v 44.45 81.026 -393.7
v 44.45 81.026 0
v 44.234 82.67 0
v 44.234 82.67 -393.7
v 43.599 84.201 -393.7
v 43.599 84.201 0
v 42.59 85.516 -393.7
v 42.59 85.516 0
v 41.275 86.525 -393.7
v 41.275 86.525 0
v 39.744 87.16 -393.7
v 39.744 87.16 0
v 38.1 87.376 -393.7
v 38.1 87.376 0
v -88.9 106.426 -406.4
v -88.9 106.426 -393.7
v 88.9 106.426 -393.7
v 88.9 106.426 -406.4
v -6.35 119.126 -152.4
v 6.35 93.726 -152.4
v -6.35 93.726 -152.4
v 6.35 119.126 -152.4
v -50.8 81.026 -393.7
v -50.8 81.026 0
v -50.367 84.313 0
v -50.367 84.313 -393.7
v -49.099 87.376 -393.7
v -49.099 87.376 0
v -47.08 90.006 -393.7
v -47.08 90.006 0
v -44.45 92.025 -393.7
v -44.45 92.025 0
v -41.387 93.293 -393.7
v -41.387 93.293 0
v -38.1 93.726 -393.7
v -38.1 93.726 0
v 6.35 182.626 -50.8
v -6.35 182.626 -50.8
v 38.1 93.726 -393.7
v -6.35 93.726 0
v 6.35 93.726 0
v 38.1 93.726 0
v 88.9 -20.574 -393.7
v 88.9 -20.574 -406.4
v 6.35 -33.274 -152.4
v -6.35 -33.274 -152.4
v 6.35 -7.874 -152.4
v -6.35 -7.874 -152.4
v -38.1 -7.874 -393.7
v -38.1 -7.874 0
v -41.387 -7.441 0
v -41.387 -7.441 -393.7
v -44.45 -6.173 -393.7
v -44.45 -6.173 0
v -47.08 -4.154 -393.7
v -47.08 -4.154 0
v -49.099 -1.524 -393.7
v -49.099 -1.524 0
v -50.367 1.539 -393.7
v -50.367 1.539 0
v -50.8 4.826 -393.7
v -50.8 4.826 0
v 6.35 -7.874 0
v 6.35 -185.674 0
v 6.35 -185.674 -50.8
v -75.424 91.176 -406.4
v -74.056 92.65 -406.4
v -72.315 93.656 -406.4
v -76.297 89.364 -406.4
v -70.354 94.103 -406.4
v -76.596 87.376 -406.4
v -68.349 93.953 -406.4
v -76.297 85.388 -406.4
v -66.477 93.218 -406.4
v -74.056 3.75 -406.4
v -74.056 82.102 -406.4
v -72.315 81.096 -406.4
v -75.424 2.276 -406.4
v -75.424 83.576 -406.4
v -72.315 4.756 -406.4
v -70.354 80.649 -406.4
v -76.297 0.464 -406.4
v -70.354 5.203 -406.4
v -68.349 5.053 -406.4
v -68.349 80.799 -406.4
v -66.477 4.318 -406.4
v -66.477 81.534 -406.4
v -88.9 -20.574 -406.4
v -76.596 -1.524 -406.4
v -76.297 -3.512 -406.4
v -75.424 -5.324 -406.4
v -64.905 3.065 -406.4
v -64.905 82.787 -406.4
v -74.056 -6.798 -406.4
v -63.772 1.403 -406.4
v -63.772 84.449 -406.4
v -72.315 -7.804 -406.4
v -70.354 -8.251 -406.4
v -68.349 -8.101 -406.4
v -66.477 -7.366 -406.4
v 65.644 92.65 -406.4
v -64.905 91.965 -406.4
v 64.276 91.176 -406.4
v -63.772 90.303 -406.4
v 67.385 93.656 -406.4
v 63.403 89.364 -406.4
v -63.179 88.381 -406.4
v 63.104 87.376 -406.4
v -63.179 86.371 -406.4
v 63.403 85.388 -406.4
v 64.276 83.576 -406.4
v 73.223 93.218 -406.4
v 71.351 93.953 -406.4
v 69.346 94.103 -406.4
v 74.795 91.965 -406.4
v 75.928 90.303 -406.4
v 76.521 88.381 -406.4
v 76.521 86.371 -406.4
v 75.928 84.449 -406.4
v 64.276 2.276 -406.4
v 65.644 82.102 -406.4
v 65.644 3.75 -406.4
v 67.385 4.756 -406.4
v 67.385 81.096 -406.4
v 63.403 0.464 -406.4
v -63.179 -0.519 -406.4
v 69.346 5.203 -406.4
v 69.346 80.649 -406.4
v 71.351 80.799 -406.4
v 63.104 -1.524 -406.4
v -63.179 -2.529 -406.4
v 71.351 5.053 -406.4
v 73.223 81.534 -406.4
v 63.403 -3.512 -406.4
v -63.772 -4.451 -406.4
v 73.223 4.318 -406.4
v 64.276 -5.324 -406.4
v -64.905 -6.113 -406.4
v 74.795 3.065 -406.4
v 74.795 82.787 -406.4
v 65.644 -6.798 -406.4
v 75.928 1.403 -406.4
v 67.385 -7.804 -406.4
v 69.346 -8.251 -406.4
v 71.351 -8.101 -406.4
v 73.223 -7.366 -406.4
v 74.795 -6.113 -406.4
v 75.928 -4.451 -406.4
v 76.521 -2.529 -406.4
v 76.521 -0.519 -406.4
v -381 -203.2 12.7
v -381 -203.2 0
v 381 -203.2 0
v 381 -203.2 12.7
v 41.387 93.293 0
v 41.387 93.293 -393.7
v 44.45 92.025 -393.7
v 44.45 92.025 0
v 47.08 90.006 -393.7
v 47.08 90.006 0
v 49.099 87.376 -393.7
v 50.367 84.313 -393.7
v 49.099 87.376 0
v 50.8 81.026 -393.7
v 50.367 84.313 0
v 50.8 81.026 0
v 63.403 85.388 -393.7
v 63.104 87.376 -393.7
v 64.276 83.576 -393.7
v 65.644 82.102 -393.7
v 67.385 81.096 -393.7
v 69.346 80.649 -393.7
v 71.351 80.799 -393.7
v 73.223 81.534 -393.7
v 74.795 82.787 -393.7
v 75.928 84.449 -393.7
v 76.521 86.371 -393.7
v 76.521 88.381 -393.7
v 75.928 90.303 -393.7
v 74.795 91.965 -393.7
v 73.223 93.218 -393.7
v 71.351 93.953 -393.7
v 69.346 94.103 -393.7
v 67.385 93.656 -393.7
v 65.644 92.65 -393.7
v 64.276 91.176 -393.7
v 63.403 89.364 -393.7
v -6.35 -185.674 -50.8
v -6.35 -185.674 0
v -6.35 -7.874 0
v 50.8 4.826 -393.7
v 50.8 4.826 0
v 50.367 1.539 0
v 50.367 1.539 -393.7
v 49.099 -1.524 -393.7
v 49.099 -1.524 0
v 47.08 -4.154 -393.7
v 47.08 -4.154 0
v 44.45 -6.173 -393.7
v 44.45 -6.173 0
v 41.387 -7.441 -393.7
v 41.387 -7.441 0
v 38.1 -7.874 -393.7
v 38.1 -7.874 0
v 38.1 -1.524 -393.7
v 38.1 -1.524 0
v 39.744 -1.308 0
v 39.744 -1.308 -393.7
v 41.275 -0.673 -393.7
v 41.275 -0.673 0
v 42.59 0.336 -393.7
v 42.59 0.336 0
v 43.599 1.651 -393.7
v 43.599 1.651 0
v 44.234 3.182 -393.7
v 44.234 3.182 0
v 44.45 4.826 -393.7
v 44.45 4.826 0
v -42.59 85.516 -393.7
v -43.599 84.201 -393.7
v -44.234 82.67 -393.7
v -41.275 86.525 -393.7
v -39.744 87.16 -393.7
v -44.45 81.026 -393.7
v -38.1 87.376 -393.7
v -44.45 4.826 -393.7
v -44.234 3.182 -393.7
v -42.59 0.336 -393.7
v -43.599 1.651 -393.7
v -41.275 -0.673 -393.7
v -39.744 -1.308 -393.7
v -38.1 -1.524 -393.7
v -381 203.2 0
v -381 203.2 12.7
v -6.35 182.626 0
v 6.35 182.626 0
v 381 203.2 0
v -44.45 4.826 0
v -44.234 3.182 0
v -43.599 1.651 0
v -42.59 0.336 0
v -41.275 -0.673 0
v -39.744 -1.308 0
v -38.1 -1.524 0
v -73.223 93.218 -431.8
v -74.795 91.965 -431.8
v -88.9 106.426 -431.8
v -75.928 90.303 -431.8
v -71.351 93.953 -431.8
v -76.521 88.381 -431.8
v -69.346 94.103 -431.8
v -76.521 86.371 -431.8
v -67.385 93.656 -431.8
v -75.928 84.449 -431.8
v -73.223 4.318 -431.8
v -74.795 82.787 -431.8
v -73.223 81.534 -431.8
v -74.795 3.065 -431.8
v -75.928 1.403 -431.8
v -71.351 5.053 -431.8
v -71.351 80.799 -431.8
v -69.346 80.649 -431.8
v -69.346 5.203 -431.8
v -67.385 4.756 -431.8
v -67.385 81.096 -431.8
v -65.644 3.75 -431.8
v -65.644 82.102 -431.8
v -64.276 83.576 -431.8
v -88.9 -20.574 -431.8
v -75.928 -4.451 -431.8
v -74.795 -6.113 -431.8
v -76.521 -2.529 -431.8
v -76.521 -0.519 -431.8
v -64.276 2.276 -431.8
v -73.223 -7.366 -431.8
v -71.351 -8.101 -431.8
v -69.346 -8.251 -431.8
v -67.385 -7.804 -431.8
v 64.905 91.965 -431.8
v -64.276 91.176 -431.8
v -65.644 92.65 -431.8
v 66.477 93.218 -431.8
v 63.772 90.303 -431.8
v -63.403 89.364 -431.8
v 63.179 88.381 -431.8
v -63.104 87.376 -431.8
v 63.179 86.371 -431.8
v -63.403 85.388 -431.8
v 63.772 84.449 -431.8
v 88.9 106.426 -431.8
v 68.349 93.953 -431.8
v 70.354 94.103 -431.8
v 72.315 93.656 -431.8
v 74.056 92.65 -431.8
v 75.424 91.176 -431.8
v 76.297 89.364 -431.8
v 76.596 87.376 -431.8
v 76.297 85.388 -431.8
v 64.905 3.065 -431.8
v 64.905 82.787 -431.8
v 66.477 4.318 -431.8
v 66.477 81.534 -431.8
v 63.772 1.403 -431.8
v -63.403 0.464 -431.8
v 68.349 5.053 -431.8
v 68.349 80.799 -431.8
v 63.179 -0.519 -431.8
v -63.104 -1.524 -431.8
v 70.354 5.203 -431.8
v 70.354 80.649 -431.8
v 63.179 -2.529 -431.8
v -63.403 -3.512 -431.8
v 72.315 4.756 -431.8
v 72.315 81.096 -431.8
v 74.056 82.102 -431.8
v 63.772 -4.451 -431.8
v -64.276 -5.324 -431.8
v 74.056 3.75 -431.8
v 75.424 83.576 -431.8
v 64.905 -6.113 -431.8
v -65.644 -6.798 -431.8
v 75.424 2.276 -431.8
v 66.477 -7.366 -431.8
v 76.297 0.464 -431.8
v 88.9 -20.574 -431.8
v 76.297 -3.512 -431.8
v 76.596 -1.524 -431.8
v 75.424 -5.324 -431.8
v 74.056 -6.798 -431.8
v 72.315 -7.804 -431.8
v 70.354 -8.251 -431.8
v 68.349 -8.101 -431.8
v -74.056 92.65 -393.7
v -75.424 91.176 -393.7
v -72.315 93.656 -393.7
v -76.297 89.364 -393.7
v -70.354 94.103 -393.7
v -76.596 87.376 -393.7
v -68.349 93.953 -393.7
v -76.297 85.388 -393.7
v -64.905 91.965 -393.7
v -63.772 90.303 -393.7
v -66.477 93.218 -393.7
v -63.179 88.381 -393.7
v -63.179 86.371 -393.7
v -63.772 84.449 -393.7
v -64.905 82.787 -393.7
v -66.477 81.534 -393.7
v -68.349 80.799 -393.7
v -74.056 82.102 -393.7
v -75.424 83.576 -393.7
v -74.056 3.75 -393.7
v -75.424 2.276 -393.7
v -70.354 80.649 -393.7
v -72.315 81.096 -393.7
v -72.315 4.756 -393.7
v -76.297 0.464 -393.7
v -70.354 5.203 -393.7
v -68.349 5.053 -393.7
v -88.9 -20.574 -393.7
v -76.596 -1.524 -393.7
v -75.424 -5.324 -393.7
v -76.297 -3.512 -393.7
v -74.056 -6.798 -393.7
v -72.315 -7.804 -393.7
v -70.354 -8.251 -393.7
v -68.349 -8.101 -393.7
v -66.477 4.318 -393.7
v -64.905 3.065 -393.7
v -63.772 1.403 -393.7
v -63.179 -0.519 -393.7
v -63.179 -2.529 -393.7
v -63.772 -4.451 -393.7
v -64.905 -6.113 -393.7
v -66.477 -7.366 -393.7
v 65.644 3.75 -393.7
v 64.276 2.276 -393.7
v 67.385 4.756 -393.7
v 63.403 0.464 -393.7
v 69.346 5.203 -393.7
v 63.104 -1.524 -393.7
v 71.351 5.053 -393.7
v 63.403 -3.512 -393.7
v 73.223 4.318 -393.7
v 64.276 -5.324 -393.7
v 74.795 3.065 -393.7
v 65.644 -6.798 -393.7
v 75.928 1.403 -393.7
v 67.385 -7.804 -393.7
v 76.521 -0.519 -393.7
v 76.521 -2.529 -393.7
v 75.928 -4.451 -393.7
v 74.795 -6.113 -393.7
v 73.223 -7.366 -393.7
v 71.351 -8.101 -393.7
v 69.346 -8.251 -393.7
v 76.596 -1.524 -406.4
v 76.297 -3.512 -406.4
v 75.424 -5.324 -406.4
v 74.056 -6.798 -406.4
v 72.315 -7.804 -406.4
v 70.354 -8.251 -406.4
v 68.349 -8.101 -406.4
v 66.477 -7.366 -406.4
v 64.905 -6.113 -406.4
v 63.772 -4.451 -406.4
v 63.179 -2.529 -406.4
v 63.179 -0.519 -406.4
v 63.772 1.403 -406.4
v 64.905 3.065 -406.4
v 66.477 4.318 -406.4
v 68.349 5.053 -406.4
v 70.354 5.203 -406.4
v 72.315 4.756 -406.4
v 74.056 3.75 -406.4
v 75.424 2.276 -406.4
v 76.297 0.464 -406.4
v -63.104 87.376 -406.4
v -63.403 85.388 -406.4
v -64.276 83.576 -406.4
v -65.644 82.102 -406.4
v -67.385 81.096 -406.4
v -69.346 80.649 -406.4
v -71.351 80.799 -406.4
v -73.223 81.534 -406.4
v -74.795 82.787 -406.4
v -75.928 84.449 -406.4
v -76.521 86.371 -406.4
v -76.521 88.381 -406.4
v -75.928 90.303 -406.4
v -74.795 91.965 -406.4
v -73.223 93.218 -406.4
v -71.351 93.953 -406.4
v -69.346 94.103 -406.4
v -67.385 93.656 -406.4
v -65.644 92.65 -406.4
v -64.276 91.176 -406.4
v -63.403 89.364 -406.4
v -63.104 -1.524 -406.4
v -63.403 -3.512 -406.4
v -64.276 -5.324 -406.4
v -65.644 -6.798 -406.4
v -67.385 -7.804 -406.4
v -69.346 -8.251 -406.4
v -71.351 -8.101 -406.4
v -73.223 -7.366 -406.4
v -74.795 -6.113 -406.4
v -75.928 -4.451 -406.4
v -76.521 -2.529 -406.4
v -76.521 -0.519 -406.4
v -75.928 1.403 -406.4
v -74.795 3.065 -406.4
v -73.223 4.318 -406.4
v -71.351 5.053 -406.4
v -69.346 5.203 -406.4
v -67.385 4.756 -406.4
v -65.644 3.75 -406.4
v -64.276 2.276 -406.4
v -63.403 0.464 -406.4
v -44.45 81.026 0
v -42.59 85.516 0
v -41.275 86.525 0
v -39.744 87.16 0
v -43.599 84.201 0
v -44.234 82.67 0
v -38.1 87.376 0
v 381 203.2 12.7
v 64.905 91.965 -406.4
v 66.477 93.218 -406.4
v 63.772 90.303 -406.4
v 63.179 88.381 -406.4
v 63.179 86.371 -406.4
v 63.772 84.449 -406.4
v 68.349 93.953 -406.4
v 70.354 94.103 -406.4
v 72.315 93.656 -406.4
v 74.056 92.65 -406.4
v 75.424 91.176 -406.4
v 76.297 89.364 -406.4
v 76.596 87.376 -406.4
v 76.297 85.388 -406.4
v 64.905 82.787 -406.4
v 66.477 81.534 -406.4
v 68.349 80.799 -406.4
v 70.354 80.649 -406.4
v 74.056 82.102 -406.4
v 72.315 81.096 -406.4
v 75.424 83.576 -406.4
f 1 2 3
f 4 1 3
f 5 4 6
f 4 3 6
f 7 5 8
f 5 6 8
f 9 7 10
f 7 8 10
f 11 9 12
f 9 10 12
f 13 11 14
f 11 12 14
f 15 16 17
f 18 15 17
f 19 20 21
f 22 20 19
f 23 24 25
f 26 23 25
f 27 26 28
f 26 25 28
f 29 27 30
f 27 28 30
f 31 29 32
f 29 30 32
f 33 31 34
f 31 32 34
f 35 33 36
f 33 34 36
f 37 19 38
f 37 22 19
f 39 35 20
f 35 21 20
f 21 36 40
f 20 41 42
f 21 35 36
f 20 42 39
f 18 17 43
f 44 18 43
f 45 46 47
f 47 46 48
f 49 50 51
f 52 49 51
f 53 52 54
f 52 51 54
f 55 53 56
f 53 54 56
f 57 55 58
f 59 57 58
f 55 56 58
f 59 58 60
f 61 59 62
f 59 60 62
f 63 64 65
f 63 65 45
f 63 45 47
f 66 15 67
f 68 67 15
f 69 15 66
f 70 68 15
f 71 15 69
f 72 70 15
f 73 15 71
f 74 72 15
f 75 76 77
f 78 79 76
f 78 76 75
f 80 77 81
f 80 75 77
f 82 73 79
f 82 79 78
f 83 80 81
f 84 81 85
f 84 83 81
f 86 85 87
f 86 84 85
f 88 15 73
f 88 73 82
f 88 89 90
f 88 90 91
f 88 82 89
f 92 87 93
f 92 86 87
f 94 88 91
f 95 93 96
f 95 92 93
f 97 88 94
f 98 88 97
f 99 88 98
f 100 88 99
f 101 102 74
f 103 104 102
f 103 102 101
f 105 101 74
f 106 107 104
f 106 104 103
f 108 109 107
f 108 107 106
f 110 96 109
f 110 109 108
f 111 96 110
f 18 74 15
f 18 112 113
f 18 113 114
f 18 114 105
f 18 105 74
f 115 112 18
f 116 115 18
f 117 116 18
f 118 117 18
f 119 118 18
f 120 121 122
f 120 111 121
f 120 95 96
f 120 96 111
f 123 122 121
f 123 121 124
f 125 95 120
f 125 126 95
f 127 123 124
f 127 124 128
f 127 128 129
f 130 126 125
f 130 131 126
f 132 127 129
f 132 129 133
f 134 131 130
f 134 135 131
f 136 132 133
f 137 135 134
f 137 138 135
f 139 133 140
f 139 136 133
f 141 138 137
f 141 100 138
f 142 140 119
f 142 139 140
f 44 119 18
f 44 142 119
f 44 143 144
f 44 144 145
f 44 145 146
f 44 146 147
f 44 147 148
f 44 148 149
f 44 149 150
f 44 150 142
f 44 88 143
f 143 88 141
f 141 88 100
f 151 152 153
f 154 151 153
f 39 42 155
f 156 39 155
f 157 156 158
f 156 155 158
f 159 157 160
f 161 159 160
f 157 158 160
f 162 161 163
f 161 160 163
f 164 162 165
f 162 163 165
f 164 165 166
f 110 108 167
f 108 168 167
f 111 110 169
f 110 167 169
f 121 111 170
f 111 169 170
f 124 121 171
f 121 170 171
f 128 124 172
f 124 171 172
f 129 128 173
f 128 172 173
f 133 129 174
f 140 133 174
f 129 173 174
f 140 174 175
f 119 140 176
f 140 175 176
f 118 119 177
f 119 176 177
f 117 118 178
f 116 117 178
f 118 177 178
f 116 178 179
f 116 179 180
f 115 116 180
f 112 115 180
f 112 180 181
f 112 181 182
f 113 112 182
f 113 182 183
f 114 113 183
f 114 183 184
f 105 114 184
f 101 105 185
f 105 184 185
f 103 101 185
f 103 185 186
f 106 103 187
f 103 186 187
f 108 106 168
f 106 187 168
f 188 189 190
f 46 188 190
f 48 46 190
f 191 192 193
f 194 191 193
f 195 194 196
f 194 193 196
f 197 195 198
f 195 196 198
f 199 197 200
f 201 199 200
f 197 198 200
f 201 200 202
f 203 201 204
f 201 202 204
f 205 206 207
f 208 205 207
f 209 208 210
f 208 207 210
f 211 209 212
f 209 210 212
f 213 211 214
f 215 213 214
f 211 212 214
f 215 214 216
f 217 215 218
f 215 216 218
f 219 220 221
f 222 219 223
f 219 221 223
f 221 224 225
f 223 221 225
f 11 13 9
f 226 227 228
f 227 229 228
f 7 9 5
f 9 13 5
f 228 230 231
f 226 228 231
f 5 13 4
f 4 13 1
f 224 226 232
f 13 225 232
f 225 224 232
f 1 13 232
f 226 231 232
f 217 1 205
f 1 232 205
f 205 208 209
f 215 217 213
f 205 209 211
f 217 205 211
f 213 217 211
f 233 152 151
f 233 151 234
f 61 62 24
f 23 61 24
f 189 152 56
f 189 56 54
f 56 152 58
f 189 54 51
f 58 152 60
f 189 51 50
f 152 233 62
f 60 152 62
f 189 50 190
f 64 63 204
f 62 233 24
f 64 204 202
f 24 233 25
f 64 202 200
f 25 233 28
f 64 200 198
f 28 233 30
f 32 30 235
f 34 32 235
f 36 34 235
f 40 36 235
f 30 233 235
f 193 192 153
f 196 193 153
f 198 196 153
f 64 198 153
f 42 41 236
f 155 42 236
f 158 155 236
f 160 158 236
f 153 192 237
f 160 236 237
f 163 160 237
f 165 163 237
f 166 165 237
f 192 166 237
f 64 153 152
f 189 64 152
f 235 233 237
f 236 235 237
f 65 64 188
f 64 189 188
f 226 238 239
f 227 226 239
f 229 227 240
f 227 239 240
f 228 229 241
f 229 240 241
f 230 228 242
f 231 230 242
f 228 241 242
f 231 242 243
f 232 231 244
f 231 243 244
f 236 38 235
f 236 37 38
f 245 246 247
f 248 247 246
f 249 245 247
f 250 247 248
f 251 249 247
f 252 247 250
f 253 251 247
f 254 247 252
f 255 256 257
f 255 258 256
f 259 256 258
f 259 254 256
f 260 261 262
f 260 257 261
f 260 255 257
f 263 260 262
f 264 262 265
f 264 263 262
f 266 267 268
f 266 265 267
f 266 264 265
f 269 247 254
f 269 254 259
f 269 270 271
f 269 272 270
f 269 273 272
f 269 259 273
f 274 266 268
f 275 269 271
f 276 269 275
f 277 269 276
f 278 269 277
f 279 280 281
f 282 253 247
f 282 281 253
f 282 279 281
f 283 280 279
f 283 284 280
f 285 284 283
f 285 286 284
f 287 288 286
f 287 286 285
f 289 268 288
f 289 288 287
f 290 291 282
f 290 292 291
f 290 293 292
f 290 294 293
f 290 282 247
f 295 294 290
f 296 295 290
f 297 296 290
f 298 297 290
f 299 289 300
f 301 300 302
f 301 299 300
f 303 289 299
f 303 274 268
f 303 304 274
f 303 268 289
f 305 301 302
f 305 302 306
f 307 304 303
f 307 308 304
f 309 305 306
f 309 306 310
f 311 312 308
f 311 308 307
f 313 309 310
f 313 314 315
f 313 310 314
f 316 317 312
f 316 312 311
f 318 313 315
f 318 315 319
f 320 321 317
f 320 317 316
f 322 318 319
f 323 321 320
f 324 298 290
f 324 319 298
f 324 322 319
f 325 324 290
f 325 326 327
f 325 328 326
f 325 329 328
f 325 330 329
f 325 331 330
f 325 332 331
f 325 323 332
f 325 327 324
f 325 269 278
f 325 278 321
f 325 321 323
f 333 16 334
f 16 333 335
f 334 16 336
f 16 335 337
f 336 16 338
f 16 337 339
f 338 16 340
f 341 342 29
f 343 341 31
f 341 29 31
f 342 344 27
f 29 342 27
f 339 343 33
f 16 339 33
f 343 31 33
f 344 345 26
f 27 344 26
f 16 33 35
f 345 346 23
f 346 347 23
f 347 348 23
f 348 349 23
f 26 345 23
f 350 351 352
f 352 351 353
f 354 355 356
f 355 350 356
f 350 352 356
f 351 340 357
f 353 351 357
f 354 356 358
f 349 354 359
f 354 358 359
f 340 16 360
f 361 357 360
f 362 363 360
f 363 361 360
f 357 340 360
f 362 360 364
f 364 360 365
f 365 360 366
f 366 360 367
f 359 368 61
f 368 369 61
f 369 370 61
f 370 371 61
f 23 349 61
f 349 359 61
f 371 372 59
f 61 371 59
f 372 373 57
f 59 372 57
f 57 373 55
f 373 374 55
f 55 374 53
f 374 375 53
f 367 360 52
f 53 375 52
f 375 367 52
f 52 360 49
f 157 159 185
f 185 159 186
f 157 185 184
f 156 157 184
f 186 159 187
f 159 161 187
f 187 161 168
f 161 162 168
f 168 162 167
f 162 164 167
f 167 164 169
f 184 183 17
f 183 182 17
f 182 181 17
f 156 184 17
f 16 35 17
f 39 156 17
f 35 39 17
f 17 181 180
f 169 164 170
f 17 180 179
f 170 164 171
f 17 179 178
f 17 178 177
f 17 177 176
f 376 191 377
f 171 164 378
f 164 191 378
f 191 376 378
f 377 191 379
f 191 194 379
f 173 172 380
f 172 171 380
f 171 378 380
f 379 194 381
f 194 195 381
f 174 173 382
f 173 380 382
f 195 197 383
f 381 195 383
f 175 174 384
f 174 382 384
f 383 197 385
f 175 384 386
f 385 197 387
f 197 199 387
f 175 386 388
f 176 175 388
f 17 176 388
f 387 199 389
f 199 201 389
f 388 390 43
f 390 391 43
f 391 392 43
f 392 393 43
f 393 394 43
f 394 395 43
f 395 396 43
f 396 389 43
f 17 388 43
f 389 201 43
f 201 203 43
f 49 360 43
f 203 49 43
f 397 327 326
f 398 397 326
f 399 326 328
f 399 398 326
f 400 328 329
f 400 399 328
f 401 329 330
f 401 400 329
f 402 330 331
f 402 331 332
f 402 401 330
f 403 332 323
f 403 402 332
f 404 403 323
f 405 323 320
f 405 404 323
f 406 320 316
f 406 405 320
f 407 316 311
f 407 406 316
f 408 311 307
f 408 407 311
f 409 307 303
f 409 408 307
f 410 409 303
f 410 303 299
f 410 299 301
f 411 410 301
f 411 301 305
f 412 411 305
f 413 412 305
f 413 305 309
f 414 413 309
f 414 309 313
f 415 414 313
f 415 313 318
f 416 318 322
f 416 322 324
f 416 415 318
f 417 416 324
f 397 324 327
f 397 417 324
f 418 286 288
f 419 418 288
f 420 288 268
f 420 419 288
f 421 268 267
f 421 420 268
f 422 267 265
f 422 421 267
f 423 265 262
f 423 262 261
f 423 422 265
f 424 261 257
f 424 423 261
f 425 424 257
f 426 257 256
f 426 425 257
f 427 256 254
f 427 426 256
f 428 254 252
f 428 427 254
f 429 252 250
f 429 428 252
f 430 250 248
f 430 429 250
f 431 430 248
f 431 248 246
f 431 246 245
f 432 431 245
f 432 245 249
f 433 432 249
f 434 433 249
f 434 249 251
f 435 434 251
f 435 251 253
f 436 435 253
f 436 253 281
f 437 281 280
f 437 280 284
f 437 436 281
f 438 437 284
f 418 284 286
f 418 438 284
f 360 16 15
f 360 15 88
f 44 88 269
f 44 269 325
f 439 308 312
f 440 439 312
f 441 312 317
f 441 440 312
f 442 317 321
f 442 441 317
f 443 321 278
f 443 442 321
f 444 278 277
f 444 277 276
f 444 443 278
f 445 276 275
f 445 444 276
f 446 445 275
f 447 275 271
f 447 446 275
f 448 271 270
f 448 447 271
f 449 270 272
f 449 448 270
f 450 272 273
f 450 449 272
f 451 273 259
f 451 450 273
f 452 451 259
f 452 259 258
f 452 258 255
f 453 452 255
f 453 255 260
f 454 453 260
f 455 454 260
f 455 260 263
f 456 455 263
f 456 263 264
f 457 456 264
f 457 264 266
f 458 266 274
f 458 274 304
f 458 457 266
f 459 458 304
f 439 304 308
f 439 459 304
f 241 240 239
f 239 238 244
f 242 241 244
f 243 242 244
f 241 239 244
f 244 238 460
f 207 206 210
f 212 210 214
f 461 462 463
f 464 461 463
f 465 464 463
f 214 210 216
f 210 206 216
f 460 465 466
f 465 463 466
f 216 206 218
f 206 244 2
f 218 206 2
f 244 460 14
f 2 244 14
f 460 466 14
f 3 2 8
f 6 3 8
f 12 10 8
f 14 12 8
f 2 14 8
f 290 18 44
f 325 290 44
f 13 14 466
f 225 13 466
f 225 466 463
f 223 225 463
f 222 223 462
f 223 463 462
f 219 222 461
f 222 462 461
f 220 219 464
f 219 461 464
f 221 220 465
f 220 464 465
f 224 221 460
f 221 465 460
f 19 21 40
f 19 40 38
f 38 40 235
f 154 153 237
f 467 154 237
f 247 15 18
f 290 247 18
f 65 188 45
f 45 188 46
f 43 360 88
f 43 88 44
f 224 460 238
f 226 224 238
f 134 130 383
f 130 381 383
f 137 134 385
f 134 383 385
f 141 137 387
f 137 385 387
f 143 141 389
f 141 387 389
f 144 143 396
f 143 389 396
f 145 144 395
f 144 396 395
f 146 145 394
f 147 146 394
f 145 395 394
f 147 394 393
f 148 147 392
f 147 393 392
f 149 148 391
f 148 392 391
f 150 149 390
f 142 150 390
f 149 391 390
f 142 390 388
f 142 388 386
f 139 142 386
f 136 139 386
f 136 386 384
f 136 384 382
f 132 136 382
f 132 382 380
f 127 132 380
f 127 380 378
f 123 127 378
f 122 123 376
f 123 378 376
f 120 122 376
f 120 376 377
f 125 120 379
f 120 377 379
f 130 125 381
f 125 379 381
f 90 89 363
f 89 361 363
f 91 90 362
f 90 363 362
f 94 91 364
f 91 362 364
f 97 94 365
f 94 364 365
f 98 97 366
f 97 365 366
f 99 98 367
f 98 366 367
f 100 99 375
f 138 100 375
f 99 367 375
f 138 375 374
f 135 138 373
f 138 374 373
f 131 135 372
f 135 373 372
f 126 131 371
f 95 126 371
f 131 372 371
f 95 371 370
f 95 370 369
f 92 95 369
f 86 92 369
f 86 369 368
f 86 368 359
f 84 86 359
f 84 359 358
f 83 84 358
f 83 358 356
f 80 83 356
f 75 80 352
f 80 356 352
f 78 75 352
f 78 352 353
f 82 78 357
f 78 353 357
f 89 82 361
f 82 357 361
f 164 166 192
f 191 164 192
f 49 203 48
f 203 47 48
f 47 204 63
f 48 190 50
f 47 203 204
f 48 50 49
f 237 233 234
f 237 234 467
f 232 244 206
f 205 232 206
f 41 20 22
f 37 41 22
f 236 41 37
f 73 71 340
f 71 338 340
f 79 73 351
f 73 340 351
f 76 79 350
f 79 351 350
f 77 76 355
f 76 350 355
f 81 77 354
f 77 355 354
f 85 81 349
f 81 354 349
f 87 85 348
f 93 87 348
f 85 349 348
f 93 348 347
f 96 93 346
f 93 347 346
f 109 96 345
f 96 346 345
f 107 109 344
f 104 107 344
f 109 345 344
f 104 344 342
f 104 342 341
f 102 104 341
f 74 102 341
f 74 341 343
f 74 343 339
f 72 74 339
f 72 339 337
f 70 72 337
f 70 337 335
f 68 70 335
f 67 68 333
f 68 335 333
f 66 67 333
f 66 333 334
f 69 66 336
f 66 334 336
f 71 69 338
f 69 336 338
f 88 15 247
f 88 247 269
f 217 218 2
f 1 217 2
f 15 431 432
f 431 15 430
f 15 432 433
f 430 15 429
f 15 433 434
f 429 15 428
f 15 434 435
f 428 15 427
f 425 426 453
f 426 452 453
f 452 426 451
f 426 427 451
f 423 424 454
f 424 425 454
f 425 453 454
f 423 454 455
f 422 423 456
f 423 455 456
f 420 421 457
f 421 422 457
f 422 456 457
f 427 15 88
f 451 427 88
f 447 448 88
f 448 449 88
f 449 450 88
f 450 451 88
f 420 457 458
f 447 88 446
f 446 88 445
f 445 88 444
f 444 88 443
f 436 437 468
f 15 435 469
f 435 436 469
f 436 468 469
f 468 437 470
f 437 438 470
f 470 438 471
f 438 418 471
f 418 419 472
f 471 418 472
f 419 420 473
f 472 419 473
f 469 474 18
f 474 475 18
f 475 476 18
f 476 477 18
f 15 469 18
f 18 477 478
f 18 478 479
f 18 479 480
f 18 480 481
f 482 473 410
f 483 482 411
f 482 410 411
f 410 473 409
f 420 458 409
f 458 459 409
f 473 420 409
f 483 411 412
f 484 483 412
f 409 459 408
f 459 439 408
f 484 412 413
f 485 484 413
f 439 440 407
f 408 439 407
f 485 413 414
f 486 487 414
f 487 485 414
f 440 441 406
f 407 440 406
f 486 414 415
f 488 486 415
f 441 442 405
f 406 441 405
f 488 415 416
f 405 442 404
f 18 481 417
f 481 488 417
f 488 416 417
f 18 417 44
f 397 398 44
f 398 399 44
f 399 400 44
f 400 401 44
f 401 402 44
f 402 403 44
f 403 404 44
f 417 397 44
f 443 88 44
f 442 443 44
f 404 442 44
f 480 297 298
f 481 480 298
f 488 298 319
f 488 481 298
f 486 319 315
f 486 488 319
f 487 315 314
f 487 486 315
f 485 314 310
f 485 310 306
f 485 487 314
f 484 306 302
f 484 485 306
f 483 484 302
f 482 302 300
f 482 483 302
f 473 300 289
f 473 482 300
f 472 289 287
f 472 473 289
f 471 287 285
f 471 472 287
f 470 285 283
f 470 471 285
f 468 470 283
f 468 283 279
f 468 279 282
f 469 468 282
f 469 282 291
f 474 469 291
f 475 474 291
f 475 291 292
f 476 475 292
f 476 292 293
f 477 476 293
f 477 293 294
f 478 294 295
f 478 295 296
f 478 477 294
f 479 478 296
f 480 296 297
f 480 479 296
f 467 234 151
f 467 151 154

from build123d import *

# Parameters (mm, degrees)
F0_W      = 762
F0_H      = 406.4
F1_DEPTH  = 12.7
F3_DEPTH  = 393.7
F4_W      = 177.8
F4_H      = 127
F5_DEPTH  = 12.7
F7_D      = 13.49248
F7_DEPTH  = 12.7
F7_TIP    = 4.0535499425
F9_DEPTH  = 6.35
F10_W     = 177.8
F10_H     = 127
F10_R     = 6.74624
F11_DEPTH = 25.4


with BuildPart() as f1:
    # F0 (on Top) → F1 (new body)
    with BuildSketch(Plane.XY):
        Rectangle(F0_W, F0_H)
    extrude(amount=F1_DEPTH)

    # F2 (on face) → F3 (join)
    with BuildSketch(Plane(origin=(0, 0, 0), x_dir=(1, 0, 0), z_dir=(0, 0, -1))):
        with BuildLine():
            ThreePointArc((-50.8, -81.026), (-47.0802561211, -90.0062561211), (-38.1, -93.726))
            Line((-38.1, -93.726), (38.1, -93.726))
            ThreePointArc((38.1, -93.726), (47.0802561211, -90.0062561211), (50.8, -81.026))
            Line((50.8, -81.026), (50.8, -4.826))
            ThreePointArc((50.8, -4.826), (47.0802561211, 4.1542561211), (38.1, 7.874))
            Line((38.1, 7.874), (-38.1, 7.874))
            ThreePointArc((-38.1, 7.874), (-47.0802561211, 4.1542561211), (-50.8, -4.826))
            Line((-50.8, -4.826), (-50.8, -81.026))
        make_face()
        with BuildLine():
            ThreePointArc((-44.45, -4.826), (-42.5901280605, -0.3358719395), (-38.1, 1.524))
            Line((-38.1, 1.524), (38.1, 1.524))
            ThreePointArc((38.1, 1.524), (42.5901280605, -0.3358719395), (44.45, -4.826))
            Line((44.45, -4.826), (44.45, -81.026))
            ThreePointArc((44.45, -81.026), (42.5901280605, -85.5161280605), (38.1, -87.376))
            Line((38.1, -87.376), (-38.1, -87.376))
            ThreePointArc((-38.1, -87.376), (-42.5901280605, -85.5161280605), (-44.45, -81.026))
            Line((-44.45, -81.026), (-44.45, -4.826))
        make_face(mode=Mode.SUBTRACT)
    extrude(amount=F3_DEPTH)

    # F4 (on face) → F5 (join)
    with BuildSketch(Plane(origin=(0, 0, -393.7), x_dir=(1, 0, 0), z_dir=(0, 0, -1))):
        with Locations((0, -42.926)):
            Rectangle(F4_W, F4_H)
        with BuildLine():
            ThreePointArc((-38.1, -93.726), (-47.0802561211, -90.0062561211), (-50.8, -81.026))
            Line((-50.8, -81.026), (-50.8, -4.826))
            ThreePointArc((-50.8, -4.826), (-47.0802561211, 4.1542561211), (-38.1, 7.874))
            Line((-38.1, 7.874), (38.1, 7.874))
            ThreePointArc((38.1, 7.874), (47.0802561211, 4.1542561211), (50.8, -4.826))
            Line((50.8, -4.826), (50.8, -81.026))
            ThreePointArc((50.8, -81.026), (47.0802561211, -90.0062561211), (38.1, -93.726))
            Line((38.1, -93.726), (-38.1, -93.726))
        make_face(mode=Mode.SUBTRACT)
        with BuildLine():
            Line((-50.8, -4.826), (-50.8, -81.026))
            ThreePointArc((-50.8, -81.026), (-47.0802561211, -90.0062561211), (-38.1, -93.726))
            Line((-38.1, -93.726), (38.1, -93.726))
            ThreePointArc((38.1, -93.726), (47.0802561211, -90.0062561211), (50.8, -81.026))
            Line((50.8, -81.026), (50.8, -4.826))
            ThreePointArc((50.8, -4.826), (47.0802561211, 4.1542561211), (38.1, 7.874))
            Line((38.1, 7.874), (-38.1, 7.874))
            ThreePointArc((-38.1, 7.874), (-47.0802561211, 4.1542561211), (-50.8, -4.826))
        make_face()
        with BuildLine():
            Line((-44.45, -81.026), (-44.45, -4.826))
            ThreePointArc((-44.45, -4.826), (-42.5901280605, -0.3358719395), (-38.1, 1.524))
            Line((-38.1, 1.524), (38.1, 1.524))
            ThreePointArc((38.1, 1.524), (42.5901280605, -0.3358719395), (44.45, -4.826))
            Line((44.45, -4.826), (44.45, -81.026))
            ThreePointArc((44.45, -81.026), (42.5901280605, -85.5161280605), (38.1, -87.376))
            Line((38.1, -87.376), (-38.1, -87.376))
            ThreePointArc((-38.1, -87.376), (-42.5901280605, -85.5161280605), (-44.45, -81.026))
        make_face(mode=Mode.SUBTRACT)
        with BuildLine():
            ThreePointArc((-38.1, 1.524), (-42.5901280605, -0.3358719395), (-44.45, -4.826))
            Line((-44.45, -4.826), (-44.45, -81.026))
            ThreePointArc((-44.45, -81.026), (-42.5901280605, -85.5161280605), (-38.1, -87.376))
            Line((-38.1, -87.376), (38.1, -87.376))
            ThreePointArc((38.1, -87.376), (42.5901280605, -85.5161280605), (44.45, -81.026))
            Line((44.45, -81.026), (44.45, -4.826))
            ThreePointArc((44.45, -4.826), (42.5901280605, -0.3358719395), (38.1, 1.524))
            Line((38.1, 1.524), (-38.1, 1.524))
        make_face()
    extrude(amount=F5_DEPTH)

    # F7
    with Locations(Plane(origin=(0, 0, -406.4), x_dir=(1, 0, 0), z_dir=(0, 0, -1))):
        with Locations((-69.85, 1.524), (-69.85, -87.376), (69.85, -87.376), (69.85, 1.524)):
            Hole(F7_D / 2, depth=F7_DEPTH)
            with Locations((0, 0, -(F7_DEPTH + F7_TIP / 2))):  # 118° drill point
                Cone(0, F7_D / 2, F7_TIP, mode=Mode.SUBTRACT)

    # F8 (on Right) → F9 (join, symmetric)
    with BuildSketch(Plane.YZ):
        Polygon((-7.874, -152.4), (-7.874, 0), (-185.674, 0), (-185.674, -50.8), (-33.274, -152.4), align=None)
        Polygon((182.626, 0), (93.726, 0), (93.726, -152.4), (119.126, -152.4), (182.626, -50.8), align=None)
    extrude(amount=F9_DEPTH, both=True)


with BuildPart() as f11:
    # F10 (on face) → F11 (new body)
    with BuildSketch(Plane(origin=(0, 0, -406.4), x_dir=(1, 0, 0), z_dir=(0, 0, -1))):
        with Locations((0, -42.926)):
            Rectangle(F10_W, F10_H)
        with Locations((-69.85, -87.376)):
            Circle(F10_R, mode=Mode.SUBTRACT)
        with Locations((69.85, -87.376)):
            Circle(F10_R, mode=Mode.SUBTRACT)
        with Locations((-69.85, 1.524)):
            Circle(F10_R, mode=Mode.SUBTRACT)
        with Locations((69.85, 1.524)):
            Circle(F10_R, mode=Mode.SUBTRACT)
    extrude(amount=F11_DEPTH)


solid = Compound([f1.part, f11.part])
